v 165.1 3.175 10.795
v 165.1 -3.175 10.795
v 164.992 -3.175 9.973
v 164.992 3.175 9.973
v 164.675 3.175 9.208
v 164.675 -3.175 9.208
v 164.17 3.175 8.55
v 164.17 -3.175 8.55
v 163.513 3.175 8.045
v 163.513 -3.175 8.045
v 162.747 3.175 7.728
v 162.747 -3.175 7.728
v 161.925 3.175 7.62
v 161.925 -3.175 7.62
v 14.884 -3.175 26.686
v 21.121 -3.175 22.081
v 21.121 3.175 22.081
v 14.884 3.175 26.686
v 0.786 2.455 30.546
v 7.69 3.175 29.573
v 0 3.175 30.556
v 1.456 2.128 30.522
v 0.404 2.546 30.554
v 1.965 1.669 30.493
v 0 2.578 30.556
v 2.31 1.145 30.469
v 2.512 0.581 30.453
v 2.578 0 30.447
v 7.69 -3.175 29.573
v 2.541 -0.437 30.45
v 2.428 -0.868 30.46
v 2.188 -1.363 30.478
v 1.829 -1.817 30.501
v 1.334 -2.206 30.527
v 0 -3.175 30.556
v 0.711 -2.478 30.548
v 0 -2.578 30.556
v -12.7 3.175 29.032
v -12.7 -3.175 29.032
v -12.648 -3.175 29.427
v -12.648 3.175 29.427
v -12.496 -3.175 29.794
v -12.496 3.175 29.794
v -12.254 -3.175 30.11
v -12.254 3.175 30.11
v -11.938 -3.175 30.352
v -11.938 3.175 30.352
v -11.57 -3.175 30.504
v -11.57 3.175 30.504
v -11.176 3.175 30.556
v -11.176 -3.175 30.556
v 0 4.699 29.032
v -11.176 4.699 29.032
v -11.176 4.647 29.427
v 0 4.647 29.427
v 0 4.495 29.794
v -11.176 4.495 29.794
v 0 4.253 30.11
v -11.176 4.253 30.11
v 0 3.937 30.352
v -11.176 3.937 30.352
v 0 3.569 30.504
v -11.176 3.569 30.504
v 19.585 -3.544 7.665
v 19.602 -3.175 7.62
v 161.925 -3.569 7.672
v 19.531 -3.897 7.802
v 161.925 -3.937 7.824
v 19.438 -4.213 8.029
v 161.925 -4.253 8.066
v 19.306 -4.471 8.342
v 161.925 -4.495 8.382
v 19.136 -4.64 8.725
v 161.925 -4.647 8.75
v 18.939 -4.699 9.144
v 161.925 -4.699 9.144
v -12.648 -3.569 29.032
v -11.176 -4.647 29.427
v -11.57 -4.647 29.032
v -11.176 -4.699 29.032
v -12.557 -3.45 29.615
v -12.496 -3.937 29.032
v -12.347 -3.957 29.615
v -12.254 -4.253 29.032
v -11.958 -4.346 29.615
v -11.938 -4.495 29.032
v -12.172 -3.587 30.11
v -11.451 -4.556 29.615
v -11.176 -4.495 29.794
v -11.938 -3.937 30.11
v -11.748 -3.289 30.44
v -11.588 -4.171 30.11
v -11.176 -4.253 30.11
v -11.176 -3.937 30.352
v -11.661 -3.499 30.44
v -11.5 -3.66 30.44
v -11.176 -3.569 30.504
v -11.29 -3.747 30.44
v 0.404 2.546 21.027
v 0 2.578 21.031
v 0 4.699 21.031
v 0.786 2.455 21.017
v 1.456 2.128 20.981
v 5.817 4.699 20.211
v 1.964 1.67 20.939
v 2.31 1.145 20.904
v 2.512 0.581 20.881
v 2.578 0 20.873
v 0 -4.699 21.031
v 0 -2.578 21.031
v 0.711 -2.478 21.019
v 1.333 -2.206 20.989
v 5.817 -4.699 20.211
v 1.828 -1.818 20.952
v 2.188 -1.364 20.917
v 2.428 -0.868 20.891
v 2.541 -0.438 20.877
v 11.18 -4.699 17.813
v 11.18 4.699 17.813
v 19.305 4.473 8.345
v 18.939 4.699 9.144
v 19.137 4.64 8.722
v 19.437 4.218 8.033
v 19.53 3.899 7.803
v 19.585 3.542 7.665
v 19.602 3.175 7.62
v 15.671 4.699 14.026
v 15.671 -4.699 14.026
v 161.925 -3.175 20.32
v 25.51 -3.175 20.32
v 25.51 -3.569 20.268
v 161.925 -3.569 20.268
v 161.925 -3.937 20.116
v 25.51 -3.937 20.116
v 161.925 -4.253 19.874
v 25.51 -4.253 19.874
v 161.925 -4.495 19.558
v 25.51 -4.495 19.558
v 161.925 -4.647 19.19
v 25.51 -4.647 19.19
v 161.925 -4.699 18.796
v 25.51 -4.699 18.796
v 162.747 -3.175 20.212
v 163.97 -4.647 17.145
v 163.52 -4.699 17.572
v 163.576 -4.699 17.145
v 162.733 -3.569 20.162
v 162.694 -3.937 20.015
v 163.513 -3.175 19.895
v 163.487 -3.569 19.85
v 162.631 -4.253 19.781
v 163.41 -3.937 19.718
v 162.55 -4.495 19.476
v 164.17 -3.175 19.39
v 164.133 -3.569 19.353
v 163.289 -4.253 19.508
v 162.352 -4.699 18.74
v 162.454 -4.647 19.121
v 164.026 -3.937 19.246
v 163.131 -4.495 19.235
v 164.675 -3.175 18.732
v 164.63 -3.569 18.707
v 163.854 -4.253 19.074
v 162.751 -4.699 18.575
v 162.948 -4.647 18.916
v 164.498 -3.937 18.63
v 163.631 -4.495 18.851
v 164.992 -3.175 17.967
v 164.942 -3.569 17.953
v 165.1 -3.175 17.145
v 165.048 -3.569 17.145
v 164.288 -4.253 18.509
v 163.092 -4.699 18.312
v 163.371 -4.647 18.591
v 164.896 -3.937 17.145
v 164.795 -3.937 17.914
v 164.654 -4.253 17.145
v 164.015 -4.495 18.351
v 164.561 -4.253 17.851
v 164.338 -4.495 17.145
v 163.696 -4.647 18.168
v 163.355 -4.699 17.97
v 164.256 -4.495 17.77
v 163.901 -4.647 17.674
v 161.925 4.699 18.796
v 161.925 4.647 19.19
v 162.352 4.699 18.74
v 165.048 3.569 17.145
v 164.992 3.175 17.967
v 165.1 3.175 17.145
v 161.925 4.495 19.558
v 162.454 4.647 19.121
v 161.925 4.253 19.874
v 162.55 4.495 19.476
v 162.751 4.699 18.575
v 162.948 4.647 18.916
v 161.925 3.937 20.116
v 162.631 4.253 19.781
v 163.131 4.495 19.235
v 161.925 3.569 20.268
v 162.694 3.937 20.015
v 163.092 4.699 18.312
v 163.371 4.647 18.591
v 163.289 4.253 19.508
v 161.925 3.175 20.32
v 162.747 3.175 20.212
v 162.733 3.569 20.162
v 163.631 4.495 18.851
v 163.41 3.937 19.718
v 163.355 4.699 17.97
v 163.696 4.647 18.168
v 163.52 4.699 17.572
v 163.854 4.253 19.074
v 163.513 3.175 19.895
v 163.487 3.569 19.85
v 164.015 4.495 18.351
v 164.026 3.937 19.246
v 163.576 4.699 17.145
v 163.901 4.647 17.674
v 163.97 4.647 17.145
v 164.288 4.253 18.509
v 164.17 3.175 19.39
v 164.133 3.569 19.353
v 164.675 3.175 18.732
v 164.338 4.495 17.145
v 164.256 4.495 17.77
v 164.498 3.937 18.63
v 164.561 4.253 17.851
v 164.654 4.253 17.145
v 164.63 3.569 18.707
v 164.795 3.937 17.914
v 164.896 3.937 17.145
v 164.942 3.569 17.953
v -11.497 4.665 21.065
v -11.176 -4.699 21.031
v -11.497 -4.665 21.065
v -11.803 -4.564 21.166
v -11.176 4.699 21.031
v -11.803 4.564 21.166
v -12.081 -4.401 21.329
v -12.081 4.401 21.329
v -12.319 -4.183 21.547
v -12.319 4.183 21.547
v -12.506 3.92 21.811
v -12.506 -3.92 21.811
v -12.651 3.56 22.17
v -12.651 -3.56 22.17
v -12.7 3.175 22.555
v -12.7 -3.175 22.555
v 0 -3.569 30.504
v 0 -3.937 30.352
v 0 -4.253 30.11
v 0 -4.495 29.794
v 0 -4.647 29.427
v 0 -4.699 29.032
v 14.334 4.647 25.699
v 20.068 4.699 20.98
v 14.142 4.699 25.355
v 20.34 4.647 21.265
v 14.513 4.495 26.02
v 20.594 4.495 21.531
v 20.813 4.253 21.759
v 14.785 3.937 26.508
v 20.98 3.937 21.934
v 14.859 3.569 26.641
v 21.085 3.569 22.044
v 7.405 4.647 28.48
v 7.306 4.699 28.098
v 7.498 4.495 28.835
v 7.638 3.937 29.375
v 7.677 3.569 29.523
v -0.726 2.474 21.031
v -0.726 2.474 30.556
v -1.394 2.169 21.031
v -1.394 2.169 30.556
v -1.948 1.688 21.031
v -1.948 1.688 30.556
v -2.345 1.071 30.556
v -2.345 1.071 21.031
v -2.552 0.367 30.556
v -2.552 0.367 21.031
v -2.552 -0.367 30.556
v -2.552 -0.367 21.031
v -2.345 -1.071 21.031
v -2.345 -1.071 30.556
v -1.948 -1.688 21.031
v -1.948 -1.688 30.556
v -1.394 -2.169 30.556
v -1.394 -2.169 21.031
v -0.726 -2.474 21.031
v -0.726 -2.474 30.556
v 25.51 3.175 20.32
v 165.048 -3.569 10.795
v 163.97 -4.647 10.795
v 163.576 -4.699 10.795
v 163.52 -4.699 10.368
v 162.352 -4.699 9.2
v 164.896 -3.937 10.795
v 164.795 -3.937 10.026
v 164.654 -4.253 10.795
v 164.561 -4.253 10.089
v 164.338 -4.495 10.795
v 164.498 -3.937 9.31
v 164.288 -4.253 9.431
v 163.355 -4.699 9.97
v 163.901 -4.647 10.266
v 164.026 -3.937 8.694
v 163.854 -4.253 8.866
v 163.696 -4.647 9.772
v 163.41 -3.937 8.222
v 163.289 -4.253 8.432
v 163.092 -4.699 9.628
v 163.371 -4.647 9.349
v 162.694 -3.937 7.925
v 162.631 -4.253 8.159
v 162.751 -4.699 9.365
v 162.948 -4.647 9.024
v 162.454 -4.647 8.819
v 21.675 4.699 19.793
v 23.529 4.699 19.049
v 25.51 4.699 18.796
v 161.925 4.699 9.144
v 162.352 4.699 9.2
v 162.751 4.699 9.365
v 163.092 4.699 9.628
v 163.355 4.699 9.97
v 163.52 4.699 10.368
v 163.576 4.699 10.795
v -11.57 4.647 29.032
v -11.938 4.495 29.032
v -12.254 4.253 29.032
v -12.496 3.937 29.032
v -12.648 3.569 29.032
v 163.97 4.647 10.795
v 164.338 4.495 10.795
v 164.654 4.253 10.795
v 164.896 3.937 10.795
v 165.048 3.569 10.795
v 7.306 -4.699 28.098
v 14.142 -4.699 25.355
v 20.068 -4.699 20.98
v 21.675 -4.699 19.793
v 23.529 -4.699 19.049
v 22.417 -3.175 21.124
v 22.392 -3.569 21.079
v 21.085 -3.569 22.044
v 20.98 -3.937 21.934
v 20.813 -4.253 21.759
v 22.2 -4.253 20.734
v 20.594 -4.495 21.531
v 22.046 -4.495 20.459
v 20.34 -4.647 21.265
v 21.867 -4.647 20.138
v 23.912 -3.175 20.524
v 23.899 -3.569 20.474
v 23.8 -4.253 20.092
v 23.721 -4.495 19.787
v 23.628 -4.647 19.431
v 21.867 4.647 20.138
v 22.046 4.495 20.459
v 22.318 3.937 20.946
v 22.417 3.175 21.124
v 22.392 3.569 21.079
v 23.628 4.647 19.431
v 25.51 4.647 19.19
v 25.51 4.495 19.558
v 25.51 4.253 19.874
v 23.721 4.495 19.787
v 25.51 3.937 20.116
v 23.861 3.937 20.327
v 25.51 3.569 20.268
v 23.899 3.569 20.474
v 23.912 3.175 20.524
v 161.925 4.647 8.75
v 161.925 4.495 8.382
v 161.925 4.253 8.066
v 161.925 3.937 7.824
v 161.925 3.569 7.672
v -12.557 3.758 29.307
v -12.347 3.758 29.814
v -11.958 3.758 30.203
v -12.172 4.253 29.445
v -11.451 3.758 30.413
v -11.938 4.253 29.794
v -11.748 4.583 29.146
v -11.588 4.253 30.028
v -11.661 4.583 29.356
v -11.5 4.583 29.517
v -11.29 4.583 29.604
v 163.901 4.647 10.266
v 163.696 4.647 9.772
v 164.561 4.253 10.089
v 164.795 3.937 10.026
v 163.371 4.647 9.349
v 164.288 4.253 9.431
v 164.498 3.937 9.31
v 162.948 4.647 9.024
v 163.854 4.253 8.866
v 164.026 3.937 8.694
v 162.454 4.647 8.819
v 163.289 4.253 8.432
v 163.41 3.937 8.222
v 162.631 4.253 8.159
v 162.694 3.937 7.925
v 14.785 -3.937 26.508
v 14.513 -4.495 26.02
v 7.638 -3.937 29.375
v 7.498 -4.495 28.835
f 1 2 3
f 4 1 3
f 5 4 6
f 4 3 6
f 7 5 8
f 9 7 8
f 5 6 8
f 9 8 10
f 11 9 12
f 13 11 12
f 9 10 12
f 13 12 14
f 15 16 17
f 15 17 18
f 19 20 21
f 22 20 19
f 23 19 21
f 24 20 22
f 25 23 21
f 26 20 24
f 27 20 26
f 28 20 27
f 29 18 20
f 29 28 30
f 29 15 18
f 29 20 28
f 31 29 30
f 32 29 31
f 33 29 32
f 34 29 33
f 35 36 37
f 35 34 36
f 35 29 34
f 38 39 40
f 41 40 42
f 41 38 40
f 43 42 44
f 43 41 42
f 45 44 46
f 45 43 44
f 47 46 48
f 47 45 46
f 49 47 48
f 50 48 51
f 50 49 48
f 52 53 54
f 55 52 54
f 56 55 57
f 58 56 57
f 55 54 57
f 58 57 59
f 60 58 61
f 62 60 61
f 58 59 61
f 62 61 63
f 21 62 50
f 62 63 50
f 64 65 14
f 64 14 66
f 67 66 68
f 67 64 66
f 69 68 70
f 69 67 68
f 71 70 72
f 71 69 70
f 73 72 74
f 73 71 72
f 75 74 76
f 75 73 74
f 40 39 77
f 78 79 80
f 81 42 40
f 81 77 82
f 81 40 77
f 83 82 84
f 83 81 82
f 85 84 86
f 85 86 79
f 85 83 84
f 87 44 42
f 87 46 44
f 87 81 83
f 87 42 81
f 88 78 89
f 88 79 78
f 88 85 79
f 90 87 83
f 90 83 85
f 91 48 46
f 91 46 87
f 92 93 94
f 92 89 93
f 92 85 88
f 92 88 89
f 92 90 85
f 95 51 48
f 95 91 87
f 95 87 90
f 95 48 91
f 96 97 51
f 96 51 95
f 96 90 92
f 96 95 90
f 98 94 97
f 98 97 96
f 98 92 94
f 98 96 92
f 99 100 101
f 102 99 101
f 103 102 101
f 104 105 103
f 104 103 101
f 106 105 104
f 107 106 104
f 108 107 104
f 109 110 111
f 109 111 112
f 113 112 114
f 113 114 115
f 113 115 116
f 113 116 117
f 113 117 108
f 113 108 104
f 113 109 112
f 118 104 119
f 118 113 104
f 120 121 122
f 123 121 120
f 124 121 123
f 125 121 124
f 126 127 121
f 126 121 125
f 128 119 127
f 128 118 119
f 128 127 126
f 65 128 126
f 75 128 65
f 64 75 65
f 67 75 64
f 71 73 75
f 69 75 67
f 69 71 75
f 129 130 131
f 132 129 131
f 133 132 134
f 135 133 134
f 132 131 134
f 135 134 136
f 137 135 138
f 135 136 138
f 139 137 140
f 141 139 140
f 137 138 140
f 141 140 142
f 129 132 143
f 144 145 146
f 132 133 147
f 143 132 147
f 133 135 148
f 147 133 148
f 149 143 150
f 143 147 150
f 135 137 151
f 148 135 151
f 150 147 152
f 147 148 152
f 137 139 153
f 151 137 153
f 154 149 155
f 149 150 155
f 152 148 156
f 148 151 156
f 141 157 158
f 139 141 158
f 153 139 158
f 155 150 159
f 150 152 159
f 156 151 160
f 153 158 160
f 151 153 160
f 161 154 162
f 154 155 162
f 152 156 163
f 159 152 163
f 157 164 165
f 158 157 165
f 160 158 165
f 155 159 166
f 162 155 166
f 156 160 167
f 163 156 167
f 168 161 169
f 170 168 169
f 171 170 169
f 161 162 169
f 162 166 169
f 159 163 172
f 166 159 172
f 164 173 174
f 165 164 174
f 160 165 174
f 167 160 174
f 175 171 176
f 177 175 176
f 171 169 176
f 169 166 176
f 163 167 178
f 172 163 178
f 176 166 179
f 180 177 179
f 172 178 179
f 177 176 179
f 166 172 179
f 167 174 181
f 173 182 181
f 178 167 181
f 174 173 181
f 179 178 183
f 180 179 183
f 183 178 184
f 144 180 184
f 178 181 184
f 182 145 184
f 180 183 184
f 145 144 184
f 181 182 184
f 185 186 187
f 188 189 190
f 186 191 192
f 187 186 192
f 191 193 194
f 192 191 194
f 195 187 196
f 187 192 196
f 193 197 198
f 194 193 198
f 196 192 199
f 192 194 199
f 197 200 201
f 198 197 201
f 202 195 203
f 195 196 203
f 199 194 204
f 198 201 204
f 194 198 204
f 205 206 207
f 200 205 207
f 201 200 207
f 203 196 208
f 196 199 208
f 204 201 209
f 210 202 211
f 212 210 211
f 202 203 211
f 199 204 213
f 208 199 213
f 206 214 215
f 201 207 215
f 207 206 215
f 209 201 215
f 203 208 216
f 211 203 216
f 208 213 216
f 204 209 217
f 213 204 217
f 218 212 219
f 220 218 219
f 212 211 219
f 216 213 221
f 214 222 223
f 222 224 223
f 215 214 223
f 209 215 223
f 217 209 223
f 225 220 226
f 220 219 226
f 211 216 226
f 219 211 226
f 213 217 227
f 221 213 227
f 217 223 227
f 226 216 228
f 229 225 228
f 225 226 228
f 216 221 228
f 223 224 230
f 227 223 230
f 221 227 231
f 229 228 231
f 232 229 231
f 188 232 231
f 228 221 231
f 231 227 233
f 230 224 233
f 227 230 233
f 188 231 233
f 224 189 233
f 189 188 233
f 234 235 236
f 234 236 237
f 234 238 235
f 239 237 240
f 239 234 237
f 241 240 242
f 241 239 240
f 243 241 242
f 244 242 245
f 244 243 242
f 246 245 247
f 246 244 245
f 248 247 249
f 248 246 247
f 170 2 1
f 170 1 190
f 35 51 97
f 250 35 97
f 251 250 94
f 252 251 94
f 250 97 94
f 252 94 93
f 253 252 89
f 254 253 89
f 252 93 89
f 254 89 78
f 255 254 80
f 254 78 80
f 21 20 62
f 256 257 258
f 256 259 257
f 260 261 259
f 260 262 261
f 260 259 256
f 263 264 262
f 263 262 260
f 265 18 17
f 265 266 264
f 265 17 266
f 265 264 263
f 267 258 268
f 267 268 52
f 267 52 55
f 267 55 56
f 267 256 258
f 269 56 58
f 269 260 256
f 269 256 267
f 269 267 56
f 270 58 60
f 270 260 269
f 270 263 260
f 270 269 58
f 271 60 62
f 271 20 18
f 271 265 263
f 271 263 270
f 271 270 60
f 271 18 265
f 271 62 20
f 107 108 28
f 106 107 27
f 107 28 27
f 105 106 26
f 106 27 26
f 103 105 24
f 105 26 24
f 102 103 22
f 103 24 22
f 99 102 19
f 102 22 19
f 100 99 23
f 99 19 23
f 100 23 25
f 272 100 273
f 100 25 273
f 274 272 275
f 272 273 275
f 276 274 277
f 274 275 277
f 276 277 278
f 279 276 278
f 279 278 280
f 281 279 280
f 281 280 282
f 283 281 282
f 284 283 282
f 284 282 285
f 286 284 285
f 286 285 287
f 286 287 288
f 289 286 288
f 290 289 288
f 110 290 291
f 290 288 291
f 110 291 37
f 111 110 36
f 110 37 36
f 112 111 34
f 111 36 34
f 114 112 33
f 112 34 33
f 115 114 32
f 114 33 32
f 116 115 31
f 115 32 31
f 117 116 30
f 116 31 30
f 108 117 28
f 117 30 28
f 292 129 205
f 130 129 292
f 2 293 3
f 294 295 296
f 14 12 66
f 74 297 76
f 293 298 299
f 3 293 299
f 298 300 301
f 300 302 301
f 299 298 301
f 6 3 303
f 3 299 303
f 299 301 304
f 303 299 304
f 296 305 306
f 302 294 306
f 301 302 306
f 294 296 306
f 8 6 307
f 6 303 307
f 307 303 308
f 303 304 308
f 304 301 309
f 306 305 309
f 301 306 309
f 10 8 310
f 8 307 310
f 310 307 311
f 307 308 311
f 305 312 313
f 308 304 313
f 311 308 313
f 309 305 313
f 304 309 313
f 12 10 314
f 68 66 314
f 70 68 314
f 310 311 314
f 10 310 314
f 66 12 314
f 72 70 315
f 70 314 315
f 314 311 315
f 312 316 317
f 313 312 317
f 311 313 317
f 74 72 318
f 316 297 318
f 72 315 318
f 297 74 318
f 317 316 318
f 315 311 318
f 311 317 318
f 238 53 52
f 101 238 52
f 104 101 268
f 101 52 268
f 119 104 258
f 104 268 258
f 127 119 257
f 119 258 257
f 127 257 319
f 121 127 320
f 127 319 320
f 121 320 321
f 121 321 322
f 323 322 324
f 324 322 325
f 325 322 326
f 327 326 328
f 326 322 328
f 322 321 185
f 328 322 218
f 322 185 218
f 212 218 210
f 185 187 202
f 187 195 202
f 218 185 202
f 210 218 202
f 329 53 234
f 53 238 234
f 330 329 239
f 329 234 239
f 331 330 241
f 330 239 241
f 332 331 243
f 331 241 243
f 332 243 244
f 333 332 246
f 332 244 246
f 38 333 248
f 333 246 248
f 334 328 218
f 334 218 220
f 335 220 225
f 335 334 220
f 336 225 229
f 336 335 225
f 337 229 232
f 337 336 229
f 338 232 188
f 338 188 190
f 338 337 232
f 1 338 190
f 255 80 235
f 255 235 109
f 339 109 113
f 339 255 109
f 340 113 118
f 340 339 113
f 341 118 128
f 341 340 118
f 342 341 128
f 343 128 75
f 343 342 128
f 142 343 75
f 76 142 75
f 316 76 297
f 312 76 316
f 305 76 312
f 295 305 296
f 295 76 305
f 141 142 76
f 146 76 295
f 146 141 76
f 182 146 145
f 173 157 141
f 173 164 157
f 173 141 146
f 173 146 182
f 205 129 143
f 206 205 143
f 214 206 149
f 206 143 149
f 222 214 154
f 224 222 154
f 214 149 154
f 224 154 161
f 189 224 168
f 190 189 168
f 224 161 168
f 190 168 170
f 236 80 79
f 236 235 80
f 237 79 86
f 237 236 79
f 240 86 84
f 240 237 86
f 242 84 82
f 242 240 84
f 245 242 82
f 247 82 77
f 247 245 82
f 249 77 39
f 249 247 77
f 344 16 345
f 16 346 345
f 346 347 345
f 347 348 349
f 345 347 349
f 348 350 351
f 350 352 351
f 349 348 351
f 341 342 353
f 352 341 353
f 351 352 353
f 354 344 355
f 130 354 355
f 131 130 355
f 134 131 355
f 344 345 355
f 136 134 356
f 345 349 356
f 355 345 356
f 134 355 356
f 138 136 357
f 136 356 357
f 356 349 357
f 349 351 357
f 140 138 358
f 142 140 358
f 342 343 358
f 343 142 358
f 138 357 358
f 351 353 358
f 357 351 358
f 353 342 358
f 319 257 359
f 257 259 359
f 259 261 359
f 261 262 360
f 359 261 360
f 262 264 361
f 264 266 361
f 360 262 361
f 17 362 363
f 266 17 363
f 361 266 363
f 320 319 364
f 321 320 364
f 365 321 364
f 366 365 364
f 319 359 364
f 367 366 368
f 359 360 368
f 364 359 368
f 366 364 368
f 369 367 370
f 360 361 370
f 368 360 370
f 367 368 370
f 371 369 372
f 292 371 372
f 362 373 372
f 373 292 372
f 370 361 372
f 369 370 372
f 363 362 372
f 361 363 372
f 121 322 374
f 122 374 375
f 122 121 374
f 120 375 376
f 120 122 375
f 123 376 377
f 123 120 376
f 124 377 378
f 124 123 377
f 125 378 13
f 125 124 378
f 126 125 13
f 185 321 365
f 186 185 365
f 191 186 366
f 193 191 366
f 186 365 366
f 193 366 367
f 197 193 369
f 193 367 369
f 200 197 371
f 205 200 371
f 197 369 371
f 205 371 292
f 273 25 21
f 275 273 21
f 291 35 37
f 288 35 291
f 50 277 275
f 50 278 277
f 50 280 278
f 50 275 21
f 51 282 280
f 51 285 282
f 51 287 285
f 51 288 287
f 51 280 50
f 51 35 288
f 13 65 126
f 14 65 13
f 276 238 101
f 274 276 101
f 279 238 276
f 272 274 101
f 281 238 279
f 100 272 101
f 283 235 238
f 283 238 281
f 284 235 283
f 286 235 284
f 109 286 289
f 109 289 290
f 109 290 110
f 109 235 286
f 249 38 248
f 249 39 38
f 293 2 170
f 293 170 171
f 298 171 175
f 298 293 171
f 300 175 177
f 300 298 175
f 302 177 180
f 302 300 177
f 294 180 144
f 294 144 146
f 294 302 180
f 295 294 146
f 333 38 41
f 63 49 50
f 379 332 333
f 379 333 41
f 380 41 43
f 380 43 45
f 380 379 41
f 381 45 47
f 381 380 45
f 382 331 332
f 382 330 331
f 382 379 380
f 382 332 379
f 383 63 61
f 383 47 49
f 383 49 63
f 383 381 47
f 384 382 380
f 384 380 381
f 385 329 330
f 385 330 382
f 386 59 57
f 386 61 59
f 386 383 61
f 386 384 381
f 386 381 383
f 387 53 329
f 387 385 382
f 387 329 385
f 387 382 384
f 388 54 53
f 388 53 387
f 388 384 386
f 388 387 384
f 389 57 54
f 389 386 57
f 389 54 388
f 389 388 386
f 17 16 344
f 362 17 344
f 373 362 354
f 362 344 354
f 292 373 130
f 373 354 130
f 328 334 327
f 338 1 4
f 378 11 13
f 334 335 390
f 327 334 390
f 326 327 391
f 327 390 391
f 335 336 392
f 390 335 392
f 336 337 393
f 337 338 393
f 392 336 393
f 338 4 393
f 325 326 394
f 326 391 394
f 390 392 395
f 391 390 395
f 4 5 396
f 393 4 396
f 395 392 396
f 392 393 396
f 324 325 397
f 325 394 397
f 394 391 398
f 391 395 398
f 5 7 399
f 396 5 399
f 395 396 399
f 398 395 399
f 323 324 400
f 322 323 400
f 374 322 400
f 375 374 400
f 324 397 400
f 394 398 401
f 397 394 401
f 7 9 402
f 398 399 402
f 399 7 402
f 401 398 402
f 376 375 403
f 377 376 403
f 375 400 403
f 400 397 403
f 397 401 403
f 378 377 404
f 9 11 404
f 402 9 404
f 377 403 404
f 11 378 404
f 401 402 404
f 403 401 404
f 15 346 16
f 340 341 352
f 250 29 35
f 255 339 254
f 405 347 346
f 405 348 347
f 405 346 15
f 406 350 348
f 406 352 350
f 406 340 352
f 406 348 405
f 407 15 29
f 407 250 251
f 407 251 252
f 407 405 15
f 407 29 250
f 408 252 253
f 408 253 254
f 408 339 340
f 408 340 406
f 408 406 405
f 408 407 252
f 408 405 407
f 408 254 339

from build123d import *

# Parameters (mm, degrees)
F1_DEPTH     = 4.699
F2_R         = 3.175
F3_R         = 1.524
F4_R         = 6.35
F5_T1_DEPTH  = 11.176
F5_T3_DEPTH  = 136.4146354703
F5_T5_DEPTH  = 6.35
F5_T7_DEPTH  = 146.1327814154
F5_S11_W     = 1.524
F5_S11_H     = 1.524
F5_T12_DEPTH = 1.524
F5_S17_W     = 1.524
F5_S17_H     = 1.524
F5_T18_DEPTH = 1.524
F5_T22_ANGLE = 43.7268911646
F5_T24_ANGLE = 43.7268911646
F5_T26_ANGLE = 90
F5_T28_ANGLE = 90
F5_T30_ANGLE = 43.7268911646
F5_T32_ANGLE = 43.7268911646
F5_T34_ANGLE = 90
F5_T36_ANGLE = 90
F6_R         = 2.5781
F7_DEPTH     = 22.9372001


# Not quite as in the source:
# - a fillet or chamfer that OpenCascade refuses, or shapes differently, is made with other operations: its cross-section is extruded or revolved along the edge and cut away or added


with BuildPart() as f1:
    # F0 (on Front) → F1 (new body, symmetric)
    with BuildSketch(Plane.XZ):
        with BuildLine():
            ThreePointArc((0, 21.0312), (11.8754711368, 17.3575504816), (19.6022185846, 7.62))
            Line((19.6022185846, 7.62), (165.1, 7.62))
            Line((165.1, 7.62), (165.1, 20.32))
            Line((165.1, 20.32), (22.8205819041, 20.32))
            ThreePointArc((22.8205819041, 20.32), (12.5055862406, 27.879951062), (0, 30.5562))
            Line((0, 30.5562), (-12.7, 30.5562))
            Line((-12.7, 30.5562), (-12.7, 21.0312))
            Line((-12.7, 21.0312), (0, 21.0312))
        make_face()
    extrude(amount=F1_DEPTH, both=True)

    # F2
    f2_edges = [f1.edges().sort_by_distance(p)[0] for p in [
        (165.1, 0, 20.32),
        (165.1, 0, 7.62),
    ]]
    fillet(f2_edges, radius=F2_R)

    # F3
    f3_edges = [f1.edges().sort_by_distance(p)[0] for p in [
        (-12.7, 4.699, 25.7937),
        (-12.7, 0, 21.0312),
        (-12.7, -4.699, 25.7937),
        (-12.7, 0, 30.5562),
    ]]
    fillet(f3_edges, radius=F3_R)

    # F4
    f4_edges = [f1.edges().sort_by_distance(p)[0] for p in [
        (22.820582, 0, 20.32),
    ]]
    fillet(f4_edges, radius=F4_R)

    # F5: fillet of radius 1.524 on 2 edges, made by hand

    # F5_s2 → F5_t1 (cut)
    with BuildSketch(Plane.YZ.offset(-11.176)):
        with BuildLine():
            ThreePointArc((-3.175, 30.5562), (-4.2526307345, 30.1098307345), (-4.699, 29.0322))
            Line((-4.699, 29.0322), (-4.699, 30.5562))
            Line((-4.699, 30.5562), (-3.175, 30.5562))
        make_face()
        with BuildLine():
            ThreePointArc((4.699, 29.0322), (4.2526307345, 30.1098307345), (3.175, 30.5562))
            Line((3.175, 30.5562), (4.699, 30.5562))
            Line((4.699, 30.5562), (4.699, 29.0322))
        make_face()
    extrude(amount=F5_T1_DEPTH, mode=Mode.SUBTRACT)

    # F5_s4 → F5_t3 (cut)
    with BuildSketch(Plane.YZ.offset(25.5103645297)):
        with BuildLine():
            ThreePointArc((4.699, 18.796), (4.2526307345, 19.8736307345), (3.175, 20.32))
            Line((3.175, 20.32), (4.699, 20.32))
            Line((4.699, 20.32), (4.699, 18.796))
        make_face()
        with BuildLine():
            ThreePointArc((-3.175, 20.32), (-4.2526307345, 19.8736307345), (-4.699, 18.796))
            Line((-4.699, 18.796), (-4.699, 20.32))
            Line((-4.699, 20.32), (-3.175, 20.32))
        make_face()
    extrude(amount=F5_T3_DEPTH, mode=Mode.SUBTRACT)

    # F5_s6 → F5_t5 (cut)
    with BuildSketch(Plane.XY.offset(10.795)):
        with BuildLine():
            ThreePointArc((163.576, 4.699), (164.6536307345, 4.2526307345), (165.1, 3.175))
            Line((165.1, 3.175), (165.1, 4.699))
            Line((165.1, 4.699), (163.576, 4.699))
        make_face()
        with BuildLine():
            ThreePointArc((165.1, -3.175), (164.6536307345, -4.2526307345), (163.576, -4.699))
            Line((163.576, -4.699), (165.1, -4.699))
            Line((165.1, -4.699), (165.1, -3.175))
        make_face()
    extrude(amount=F5_T5_DEPTH, mode=Mode.SUBTRACT)

    # F5_s8 → F5_t7 (cut)
    with BuildSketch(Plane.YZ.offset(15.7922185846)):
        with BuildLine():
            ThreePointArc((4.699, 9.144), (4.2526307345, 8.0663692655), (3.175, 7.62))
            Line((3.175, 7.62), (4.699, 7.62))
            Line((4.699, 7.62), (4.699, 9.144))
        make_face()
        with BuildLine():
            ThreePointArc((-3.175, 7.62), (-4.2526307345, 8.0663692655), (-4.699, 9.144))
            Line((-4.699, 9.144), (-4.699, 7.62))
            Line((-4.699, 7.62), (-3.175, 7.62))
        make_face()
    extrude(amount=F5_T7_DEPTH, mode=Mode.SUBTRACT)


with BuildPart() as f5_tool10:
    # F5_s11 → F5_t12 (new body)
    with BuildSketch(Plane.XZ.offset(-3.175)):
        with Locations((-11.938, 29.7942)):
            Rectangle(F5_S11_W, F5_S11_H)
    extrude(amount=-F5_T12_DEPTH)

    # F5_s13 → F5_t14 (revolve, cut)
    with BuildSketch(Plane(origin=(-11.176, 3.175, 29.0322), x_dir=(0.7071067812, 0, -0.7071067812), z_dir=(0.7071067812, 0, 0.7071067812))):
        with BuildLine():
            ThreePointArc((0, -1.524), (1.524, 0), (0, 1.524))
            Line((0, 1.524), (0, -1.524))
        make_face()
    revolve(axis=Axis((-11.176, 3.175, 29.0322), (0, 1, 0)), mode=Mode.SUBTRACT)


with BuildPart() as f1_1:
    add(f1.part)

    # F5_t9: cut F5_tool10
    add(f5_tool10.part, mode=Mode.SUBTRACT)


with BuildPart() as f5_tool16:
    # F5_s17 → F5_t18 (new body)
    with BuildSketch(Plane.XY.offset(29.0322)):
        with Locations((-11.938, -3.937)):
            Rectangle(F5_S17_W, F5_S17_H)
    extrude(amount=F5_T18_DEPTH)

    # F5_s19 → F5_t20 (revolve, cut)
    with BuildSketch(Plane(origin=(-11.176, -3.175, 29.0322), x_dir=(0.7071067812, 0.7071067812, 0), z_dir=(0.7071067812, -0.7071067812, 0))):
        with BuildLine():
            ThreePointArc((0, -1.524), (1.524, 0), (0, 1.524))
            Line((0, 1.524), (0, -1.524))
        make_face()
    revolve(axis=Axis((-11.176, -3.175, 29.0322), (0, 0, 1)), mode=Mode.SUBTRACT)


with BuildPart() as f1_2:
    add(f1_1.part)

    # F5_t15: cut F5_tool16
    add(f5_tool16.part, mode=Mode.SUBTRACT)

    # F5_s21 → F5_t22 (revolve, cut)
    with BuildSketch(Plane(origin=(0, 0, 0), x_dir=(0, 1, 0), z_dir=(0.722642808, 0, -0.6912216519))):
        with BuildLine():
            ThreePointArc((4.699, 29.0322), (4.2526307345, 30.1098307345), (3.175, 30.5562))
            Line((3.175, 30.5562), (4.699, 30.5562))
            Line((4.699, 30.5562), (4.699, 29.0322))
        make_face()
    revolve(axis=Axis((0, 4.699, 0), (0, -1, 0)), revolution_arc=F5_T22_ANGLE, mode=Mode.SUBTRACT)

    # F5_s23 → F5_t24 (revolve, cut)
    with BuildSketch(Plane(origin=(0, 0, 0), x_dir=(0, 1, 0), z_dir=(-0.722642808, 0, 0.6912216519))):
        with BuildLine():
            ThreePointArc((4.699, -29.0322), (4.2526307345, -30.1098307345), (3.175, -30.5562))
            Line((3.175, -30.5562), (4.699, -30.5562))
            Line((4.699, -30.5562), (4.699, -29.0322))
        make_face()
    revolve(axis=Axis((25.5103645297, 4.699, 26.67), (0, -1, 0)), revolution_arc=F5_T24_ANGLE, mode=Mode.SUBTRACT)

    # F5_s25 → F5_t26 (revolve, cut)
    with BuildSketch(Plane.YZ.offset(161.925)):
        with BuildLine():
            ThreePointArc((4.699, 18.796), (4.2526307345, 19.8736307345), (3.175, 20.32))
            Line((3.175, 20.32), (4.699, 20.32))
            Line((4.699, 20.32), (4.699, 18.796))
        make_face()
    revolve(axis=Axis((161.925, 4.699, 17.145), (0, 1, 0)), revolution_arc=F5_T26_ANGLE, mode=Mode.SUBTRACT)

    # F5_s27 → F5_t28 (revolve, cut)
    with BuildSketch(Plane.XY.offset(10.795)):
        with BuildLine():
            ThreePointArc((163.576, 4.699), (164.6536307345, 4.2526307345), (165.1, 3.175))
            Line((165.1, 3.175), (165.1, 4.699))
            Line((165.1, 4.699), (163.576, 4.699))
        make_face()
    revolve(axis=Axis((161.925, 4.699, 10.795), (0, 1, 0)), revolution_arc=F5_T28_ANGLE, mode=Mode.SUBTRACT)

    # F5_s29 → F5_t30 (revolve, cut)
    with BuildSketch(Plane(origin=(0, 0, 0), x_dir=(0, 1, 0), z_dir=(0.722642808, 0, -0.6912216519))):
        with BuildLine():
            ThreePointArc((-3.175, 30.5562), (-4.2526307345, 30.1098307345), (-4.699, 29.0322))
            Line((-4.699, 29.0322), (-4.699, 30.5562))
            Line((-4.699, 30.5562), (-3.175, 30.5562))
        make_face()
    revolve(axis=Axis((0, -4.699, 0), (0, -1, 0)), revolution_arc=F5_T30_ANGLE, mode=Mode.SUBTRACT)

    # F5_s31 → F5_t32 (revolve, cut)
    with BuildSketch(Plane(origin=(0, 0, 0), x_dir=(0, 1, 0), z_dir=(-0.722642808, 0, 0.6912216519))):
        with BuildLine():
            ThreePointArc((-3.175, -30.5562), (-4.2526307345, -30.1098307345), (-4.699, -29.0322))
            Line((-4.699, -29.0322), (-4.699, -30.5562))
            Line((-4.699, -30.5562), (-3.175, -30.5562))
        make_face()
    revolve(axis=Axis((25.5103645297, -4.699, 26.67), (0, -1, 0)), revolution_arc=F5_T32_ANGLE, mode=Mode.SUBTRACT)

    # F5_s33 → F5_t34 (revolve, cut)
    with BuildSketch(Plane.YZ.offset(161.925)):
        with BuildLine():
            ThreePointArc((-3.175, 20.32), (-4.2526307345, 19.8736307345), (-4.699, 18.796))
            Line((-4.699, 18.796), (-4.699, 20.32))
            Line((-4.699, 20.32), (-3.175, 20.32))
        make_face()
    revolve(axis=Axis((161.925, -4.699, 17.145), (0, 1, 0)), revolution_arc=F5_T34_ANGLE, mode=Mode.SUBTRACT)

    # F5_s35 → F5_t36 (revolve, cut)
    with BuildSketch(Plane.XY.offset(10.795)):
        with BuildLine():
            ThreePointArc((165.1, -3.175), (164.6536307345, -4.2526307345), (163.576, -4.699))
            Line((163.576, -4.699), (165.1, -4.699))
            Line((165.1, -4.699), (165.1, -3.175))
        make_face()
    revolve(axis=Axis((161.925, -4.699, 10.795), (0, 1, 0)), revolution_arc=F5_T36_ANGLE, mode=Mode.SUBTRACT)

    # F6 (on face) → F7 (cut, through all)
    with BuildSketch(Plane.XY.offset(30.5562)):
        Circle(F6_R)
    extrude(amount=-F7_DEPTH, mode=Mode.SUBTRACT)


solid = f1_2.part
